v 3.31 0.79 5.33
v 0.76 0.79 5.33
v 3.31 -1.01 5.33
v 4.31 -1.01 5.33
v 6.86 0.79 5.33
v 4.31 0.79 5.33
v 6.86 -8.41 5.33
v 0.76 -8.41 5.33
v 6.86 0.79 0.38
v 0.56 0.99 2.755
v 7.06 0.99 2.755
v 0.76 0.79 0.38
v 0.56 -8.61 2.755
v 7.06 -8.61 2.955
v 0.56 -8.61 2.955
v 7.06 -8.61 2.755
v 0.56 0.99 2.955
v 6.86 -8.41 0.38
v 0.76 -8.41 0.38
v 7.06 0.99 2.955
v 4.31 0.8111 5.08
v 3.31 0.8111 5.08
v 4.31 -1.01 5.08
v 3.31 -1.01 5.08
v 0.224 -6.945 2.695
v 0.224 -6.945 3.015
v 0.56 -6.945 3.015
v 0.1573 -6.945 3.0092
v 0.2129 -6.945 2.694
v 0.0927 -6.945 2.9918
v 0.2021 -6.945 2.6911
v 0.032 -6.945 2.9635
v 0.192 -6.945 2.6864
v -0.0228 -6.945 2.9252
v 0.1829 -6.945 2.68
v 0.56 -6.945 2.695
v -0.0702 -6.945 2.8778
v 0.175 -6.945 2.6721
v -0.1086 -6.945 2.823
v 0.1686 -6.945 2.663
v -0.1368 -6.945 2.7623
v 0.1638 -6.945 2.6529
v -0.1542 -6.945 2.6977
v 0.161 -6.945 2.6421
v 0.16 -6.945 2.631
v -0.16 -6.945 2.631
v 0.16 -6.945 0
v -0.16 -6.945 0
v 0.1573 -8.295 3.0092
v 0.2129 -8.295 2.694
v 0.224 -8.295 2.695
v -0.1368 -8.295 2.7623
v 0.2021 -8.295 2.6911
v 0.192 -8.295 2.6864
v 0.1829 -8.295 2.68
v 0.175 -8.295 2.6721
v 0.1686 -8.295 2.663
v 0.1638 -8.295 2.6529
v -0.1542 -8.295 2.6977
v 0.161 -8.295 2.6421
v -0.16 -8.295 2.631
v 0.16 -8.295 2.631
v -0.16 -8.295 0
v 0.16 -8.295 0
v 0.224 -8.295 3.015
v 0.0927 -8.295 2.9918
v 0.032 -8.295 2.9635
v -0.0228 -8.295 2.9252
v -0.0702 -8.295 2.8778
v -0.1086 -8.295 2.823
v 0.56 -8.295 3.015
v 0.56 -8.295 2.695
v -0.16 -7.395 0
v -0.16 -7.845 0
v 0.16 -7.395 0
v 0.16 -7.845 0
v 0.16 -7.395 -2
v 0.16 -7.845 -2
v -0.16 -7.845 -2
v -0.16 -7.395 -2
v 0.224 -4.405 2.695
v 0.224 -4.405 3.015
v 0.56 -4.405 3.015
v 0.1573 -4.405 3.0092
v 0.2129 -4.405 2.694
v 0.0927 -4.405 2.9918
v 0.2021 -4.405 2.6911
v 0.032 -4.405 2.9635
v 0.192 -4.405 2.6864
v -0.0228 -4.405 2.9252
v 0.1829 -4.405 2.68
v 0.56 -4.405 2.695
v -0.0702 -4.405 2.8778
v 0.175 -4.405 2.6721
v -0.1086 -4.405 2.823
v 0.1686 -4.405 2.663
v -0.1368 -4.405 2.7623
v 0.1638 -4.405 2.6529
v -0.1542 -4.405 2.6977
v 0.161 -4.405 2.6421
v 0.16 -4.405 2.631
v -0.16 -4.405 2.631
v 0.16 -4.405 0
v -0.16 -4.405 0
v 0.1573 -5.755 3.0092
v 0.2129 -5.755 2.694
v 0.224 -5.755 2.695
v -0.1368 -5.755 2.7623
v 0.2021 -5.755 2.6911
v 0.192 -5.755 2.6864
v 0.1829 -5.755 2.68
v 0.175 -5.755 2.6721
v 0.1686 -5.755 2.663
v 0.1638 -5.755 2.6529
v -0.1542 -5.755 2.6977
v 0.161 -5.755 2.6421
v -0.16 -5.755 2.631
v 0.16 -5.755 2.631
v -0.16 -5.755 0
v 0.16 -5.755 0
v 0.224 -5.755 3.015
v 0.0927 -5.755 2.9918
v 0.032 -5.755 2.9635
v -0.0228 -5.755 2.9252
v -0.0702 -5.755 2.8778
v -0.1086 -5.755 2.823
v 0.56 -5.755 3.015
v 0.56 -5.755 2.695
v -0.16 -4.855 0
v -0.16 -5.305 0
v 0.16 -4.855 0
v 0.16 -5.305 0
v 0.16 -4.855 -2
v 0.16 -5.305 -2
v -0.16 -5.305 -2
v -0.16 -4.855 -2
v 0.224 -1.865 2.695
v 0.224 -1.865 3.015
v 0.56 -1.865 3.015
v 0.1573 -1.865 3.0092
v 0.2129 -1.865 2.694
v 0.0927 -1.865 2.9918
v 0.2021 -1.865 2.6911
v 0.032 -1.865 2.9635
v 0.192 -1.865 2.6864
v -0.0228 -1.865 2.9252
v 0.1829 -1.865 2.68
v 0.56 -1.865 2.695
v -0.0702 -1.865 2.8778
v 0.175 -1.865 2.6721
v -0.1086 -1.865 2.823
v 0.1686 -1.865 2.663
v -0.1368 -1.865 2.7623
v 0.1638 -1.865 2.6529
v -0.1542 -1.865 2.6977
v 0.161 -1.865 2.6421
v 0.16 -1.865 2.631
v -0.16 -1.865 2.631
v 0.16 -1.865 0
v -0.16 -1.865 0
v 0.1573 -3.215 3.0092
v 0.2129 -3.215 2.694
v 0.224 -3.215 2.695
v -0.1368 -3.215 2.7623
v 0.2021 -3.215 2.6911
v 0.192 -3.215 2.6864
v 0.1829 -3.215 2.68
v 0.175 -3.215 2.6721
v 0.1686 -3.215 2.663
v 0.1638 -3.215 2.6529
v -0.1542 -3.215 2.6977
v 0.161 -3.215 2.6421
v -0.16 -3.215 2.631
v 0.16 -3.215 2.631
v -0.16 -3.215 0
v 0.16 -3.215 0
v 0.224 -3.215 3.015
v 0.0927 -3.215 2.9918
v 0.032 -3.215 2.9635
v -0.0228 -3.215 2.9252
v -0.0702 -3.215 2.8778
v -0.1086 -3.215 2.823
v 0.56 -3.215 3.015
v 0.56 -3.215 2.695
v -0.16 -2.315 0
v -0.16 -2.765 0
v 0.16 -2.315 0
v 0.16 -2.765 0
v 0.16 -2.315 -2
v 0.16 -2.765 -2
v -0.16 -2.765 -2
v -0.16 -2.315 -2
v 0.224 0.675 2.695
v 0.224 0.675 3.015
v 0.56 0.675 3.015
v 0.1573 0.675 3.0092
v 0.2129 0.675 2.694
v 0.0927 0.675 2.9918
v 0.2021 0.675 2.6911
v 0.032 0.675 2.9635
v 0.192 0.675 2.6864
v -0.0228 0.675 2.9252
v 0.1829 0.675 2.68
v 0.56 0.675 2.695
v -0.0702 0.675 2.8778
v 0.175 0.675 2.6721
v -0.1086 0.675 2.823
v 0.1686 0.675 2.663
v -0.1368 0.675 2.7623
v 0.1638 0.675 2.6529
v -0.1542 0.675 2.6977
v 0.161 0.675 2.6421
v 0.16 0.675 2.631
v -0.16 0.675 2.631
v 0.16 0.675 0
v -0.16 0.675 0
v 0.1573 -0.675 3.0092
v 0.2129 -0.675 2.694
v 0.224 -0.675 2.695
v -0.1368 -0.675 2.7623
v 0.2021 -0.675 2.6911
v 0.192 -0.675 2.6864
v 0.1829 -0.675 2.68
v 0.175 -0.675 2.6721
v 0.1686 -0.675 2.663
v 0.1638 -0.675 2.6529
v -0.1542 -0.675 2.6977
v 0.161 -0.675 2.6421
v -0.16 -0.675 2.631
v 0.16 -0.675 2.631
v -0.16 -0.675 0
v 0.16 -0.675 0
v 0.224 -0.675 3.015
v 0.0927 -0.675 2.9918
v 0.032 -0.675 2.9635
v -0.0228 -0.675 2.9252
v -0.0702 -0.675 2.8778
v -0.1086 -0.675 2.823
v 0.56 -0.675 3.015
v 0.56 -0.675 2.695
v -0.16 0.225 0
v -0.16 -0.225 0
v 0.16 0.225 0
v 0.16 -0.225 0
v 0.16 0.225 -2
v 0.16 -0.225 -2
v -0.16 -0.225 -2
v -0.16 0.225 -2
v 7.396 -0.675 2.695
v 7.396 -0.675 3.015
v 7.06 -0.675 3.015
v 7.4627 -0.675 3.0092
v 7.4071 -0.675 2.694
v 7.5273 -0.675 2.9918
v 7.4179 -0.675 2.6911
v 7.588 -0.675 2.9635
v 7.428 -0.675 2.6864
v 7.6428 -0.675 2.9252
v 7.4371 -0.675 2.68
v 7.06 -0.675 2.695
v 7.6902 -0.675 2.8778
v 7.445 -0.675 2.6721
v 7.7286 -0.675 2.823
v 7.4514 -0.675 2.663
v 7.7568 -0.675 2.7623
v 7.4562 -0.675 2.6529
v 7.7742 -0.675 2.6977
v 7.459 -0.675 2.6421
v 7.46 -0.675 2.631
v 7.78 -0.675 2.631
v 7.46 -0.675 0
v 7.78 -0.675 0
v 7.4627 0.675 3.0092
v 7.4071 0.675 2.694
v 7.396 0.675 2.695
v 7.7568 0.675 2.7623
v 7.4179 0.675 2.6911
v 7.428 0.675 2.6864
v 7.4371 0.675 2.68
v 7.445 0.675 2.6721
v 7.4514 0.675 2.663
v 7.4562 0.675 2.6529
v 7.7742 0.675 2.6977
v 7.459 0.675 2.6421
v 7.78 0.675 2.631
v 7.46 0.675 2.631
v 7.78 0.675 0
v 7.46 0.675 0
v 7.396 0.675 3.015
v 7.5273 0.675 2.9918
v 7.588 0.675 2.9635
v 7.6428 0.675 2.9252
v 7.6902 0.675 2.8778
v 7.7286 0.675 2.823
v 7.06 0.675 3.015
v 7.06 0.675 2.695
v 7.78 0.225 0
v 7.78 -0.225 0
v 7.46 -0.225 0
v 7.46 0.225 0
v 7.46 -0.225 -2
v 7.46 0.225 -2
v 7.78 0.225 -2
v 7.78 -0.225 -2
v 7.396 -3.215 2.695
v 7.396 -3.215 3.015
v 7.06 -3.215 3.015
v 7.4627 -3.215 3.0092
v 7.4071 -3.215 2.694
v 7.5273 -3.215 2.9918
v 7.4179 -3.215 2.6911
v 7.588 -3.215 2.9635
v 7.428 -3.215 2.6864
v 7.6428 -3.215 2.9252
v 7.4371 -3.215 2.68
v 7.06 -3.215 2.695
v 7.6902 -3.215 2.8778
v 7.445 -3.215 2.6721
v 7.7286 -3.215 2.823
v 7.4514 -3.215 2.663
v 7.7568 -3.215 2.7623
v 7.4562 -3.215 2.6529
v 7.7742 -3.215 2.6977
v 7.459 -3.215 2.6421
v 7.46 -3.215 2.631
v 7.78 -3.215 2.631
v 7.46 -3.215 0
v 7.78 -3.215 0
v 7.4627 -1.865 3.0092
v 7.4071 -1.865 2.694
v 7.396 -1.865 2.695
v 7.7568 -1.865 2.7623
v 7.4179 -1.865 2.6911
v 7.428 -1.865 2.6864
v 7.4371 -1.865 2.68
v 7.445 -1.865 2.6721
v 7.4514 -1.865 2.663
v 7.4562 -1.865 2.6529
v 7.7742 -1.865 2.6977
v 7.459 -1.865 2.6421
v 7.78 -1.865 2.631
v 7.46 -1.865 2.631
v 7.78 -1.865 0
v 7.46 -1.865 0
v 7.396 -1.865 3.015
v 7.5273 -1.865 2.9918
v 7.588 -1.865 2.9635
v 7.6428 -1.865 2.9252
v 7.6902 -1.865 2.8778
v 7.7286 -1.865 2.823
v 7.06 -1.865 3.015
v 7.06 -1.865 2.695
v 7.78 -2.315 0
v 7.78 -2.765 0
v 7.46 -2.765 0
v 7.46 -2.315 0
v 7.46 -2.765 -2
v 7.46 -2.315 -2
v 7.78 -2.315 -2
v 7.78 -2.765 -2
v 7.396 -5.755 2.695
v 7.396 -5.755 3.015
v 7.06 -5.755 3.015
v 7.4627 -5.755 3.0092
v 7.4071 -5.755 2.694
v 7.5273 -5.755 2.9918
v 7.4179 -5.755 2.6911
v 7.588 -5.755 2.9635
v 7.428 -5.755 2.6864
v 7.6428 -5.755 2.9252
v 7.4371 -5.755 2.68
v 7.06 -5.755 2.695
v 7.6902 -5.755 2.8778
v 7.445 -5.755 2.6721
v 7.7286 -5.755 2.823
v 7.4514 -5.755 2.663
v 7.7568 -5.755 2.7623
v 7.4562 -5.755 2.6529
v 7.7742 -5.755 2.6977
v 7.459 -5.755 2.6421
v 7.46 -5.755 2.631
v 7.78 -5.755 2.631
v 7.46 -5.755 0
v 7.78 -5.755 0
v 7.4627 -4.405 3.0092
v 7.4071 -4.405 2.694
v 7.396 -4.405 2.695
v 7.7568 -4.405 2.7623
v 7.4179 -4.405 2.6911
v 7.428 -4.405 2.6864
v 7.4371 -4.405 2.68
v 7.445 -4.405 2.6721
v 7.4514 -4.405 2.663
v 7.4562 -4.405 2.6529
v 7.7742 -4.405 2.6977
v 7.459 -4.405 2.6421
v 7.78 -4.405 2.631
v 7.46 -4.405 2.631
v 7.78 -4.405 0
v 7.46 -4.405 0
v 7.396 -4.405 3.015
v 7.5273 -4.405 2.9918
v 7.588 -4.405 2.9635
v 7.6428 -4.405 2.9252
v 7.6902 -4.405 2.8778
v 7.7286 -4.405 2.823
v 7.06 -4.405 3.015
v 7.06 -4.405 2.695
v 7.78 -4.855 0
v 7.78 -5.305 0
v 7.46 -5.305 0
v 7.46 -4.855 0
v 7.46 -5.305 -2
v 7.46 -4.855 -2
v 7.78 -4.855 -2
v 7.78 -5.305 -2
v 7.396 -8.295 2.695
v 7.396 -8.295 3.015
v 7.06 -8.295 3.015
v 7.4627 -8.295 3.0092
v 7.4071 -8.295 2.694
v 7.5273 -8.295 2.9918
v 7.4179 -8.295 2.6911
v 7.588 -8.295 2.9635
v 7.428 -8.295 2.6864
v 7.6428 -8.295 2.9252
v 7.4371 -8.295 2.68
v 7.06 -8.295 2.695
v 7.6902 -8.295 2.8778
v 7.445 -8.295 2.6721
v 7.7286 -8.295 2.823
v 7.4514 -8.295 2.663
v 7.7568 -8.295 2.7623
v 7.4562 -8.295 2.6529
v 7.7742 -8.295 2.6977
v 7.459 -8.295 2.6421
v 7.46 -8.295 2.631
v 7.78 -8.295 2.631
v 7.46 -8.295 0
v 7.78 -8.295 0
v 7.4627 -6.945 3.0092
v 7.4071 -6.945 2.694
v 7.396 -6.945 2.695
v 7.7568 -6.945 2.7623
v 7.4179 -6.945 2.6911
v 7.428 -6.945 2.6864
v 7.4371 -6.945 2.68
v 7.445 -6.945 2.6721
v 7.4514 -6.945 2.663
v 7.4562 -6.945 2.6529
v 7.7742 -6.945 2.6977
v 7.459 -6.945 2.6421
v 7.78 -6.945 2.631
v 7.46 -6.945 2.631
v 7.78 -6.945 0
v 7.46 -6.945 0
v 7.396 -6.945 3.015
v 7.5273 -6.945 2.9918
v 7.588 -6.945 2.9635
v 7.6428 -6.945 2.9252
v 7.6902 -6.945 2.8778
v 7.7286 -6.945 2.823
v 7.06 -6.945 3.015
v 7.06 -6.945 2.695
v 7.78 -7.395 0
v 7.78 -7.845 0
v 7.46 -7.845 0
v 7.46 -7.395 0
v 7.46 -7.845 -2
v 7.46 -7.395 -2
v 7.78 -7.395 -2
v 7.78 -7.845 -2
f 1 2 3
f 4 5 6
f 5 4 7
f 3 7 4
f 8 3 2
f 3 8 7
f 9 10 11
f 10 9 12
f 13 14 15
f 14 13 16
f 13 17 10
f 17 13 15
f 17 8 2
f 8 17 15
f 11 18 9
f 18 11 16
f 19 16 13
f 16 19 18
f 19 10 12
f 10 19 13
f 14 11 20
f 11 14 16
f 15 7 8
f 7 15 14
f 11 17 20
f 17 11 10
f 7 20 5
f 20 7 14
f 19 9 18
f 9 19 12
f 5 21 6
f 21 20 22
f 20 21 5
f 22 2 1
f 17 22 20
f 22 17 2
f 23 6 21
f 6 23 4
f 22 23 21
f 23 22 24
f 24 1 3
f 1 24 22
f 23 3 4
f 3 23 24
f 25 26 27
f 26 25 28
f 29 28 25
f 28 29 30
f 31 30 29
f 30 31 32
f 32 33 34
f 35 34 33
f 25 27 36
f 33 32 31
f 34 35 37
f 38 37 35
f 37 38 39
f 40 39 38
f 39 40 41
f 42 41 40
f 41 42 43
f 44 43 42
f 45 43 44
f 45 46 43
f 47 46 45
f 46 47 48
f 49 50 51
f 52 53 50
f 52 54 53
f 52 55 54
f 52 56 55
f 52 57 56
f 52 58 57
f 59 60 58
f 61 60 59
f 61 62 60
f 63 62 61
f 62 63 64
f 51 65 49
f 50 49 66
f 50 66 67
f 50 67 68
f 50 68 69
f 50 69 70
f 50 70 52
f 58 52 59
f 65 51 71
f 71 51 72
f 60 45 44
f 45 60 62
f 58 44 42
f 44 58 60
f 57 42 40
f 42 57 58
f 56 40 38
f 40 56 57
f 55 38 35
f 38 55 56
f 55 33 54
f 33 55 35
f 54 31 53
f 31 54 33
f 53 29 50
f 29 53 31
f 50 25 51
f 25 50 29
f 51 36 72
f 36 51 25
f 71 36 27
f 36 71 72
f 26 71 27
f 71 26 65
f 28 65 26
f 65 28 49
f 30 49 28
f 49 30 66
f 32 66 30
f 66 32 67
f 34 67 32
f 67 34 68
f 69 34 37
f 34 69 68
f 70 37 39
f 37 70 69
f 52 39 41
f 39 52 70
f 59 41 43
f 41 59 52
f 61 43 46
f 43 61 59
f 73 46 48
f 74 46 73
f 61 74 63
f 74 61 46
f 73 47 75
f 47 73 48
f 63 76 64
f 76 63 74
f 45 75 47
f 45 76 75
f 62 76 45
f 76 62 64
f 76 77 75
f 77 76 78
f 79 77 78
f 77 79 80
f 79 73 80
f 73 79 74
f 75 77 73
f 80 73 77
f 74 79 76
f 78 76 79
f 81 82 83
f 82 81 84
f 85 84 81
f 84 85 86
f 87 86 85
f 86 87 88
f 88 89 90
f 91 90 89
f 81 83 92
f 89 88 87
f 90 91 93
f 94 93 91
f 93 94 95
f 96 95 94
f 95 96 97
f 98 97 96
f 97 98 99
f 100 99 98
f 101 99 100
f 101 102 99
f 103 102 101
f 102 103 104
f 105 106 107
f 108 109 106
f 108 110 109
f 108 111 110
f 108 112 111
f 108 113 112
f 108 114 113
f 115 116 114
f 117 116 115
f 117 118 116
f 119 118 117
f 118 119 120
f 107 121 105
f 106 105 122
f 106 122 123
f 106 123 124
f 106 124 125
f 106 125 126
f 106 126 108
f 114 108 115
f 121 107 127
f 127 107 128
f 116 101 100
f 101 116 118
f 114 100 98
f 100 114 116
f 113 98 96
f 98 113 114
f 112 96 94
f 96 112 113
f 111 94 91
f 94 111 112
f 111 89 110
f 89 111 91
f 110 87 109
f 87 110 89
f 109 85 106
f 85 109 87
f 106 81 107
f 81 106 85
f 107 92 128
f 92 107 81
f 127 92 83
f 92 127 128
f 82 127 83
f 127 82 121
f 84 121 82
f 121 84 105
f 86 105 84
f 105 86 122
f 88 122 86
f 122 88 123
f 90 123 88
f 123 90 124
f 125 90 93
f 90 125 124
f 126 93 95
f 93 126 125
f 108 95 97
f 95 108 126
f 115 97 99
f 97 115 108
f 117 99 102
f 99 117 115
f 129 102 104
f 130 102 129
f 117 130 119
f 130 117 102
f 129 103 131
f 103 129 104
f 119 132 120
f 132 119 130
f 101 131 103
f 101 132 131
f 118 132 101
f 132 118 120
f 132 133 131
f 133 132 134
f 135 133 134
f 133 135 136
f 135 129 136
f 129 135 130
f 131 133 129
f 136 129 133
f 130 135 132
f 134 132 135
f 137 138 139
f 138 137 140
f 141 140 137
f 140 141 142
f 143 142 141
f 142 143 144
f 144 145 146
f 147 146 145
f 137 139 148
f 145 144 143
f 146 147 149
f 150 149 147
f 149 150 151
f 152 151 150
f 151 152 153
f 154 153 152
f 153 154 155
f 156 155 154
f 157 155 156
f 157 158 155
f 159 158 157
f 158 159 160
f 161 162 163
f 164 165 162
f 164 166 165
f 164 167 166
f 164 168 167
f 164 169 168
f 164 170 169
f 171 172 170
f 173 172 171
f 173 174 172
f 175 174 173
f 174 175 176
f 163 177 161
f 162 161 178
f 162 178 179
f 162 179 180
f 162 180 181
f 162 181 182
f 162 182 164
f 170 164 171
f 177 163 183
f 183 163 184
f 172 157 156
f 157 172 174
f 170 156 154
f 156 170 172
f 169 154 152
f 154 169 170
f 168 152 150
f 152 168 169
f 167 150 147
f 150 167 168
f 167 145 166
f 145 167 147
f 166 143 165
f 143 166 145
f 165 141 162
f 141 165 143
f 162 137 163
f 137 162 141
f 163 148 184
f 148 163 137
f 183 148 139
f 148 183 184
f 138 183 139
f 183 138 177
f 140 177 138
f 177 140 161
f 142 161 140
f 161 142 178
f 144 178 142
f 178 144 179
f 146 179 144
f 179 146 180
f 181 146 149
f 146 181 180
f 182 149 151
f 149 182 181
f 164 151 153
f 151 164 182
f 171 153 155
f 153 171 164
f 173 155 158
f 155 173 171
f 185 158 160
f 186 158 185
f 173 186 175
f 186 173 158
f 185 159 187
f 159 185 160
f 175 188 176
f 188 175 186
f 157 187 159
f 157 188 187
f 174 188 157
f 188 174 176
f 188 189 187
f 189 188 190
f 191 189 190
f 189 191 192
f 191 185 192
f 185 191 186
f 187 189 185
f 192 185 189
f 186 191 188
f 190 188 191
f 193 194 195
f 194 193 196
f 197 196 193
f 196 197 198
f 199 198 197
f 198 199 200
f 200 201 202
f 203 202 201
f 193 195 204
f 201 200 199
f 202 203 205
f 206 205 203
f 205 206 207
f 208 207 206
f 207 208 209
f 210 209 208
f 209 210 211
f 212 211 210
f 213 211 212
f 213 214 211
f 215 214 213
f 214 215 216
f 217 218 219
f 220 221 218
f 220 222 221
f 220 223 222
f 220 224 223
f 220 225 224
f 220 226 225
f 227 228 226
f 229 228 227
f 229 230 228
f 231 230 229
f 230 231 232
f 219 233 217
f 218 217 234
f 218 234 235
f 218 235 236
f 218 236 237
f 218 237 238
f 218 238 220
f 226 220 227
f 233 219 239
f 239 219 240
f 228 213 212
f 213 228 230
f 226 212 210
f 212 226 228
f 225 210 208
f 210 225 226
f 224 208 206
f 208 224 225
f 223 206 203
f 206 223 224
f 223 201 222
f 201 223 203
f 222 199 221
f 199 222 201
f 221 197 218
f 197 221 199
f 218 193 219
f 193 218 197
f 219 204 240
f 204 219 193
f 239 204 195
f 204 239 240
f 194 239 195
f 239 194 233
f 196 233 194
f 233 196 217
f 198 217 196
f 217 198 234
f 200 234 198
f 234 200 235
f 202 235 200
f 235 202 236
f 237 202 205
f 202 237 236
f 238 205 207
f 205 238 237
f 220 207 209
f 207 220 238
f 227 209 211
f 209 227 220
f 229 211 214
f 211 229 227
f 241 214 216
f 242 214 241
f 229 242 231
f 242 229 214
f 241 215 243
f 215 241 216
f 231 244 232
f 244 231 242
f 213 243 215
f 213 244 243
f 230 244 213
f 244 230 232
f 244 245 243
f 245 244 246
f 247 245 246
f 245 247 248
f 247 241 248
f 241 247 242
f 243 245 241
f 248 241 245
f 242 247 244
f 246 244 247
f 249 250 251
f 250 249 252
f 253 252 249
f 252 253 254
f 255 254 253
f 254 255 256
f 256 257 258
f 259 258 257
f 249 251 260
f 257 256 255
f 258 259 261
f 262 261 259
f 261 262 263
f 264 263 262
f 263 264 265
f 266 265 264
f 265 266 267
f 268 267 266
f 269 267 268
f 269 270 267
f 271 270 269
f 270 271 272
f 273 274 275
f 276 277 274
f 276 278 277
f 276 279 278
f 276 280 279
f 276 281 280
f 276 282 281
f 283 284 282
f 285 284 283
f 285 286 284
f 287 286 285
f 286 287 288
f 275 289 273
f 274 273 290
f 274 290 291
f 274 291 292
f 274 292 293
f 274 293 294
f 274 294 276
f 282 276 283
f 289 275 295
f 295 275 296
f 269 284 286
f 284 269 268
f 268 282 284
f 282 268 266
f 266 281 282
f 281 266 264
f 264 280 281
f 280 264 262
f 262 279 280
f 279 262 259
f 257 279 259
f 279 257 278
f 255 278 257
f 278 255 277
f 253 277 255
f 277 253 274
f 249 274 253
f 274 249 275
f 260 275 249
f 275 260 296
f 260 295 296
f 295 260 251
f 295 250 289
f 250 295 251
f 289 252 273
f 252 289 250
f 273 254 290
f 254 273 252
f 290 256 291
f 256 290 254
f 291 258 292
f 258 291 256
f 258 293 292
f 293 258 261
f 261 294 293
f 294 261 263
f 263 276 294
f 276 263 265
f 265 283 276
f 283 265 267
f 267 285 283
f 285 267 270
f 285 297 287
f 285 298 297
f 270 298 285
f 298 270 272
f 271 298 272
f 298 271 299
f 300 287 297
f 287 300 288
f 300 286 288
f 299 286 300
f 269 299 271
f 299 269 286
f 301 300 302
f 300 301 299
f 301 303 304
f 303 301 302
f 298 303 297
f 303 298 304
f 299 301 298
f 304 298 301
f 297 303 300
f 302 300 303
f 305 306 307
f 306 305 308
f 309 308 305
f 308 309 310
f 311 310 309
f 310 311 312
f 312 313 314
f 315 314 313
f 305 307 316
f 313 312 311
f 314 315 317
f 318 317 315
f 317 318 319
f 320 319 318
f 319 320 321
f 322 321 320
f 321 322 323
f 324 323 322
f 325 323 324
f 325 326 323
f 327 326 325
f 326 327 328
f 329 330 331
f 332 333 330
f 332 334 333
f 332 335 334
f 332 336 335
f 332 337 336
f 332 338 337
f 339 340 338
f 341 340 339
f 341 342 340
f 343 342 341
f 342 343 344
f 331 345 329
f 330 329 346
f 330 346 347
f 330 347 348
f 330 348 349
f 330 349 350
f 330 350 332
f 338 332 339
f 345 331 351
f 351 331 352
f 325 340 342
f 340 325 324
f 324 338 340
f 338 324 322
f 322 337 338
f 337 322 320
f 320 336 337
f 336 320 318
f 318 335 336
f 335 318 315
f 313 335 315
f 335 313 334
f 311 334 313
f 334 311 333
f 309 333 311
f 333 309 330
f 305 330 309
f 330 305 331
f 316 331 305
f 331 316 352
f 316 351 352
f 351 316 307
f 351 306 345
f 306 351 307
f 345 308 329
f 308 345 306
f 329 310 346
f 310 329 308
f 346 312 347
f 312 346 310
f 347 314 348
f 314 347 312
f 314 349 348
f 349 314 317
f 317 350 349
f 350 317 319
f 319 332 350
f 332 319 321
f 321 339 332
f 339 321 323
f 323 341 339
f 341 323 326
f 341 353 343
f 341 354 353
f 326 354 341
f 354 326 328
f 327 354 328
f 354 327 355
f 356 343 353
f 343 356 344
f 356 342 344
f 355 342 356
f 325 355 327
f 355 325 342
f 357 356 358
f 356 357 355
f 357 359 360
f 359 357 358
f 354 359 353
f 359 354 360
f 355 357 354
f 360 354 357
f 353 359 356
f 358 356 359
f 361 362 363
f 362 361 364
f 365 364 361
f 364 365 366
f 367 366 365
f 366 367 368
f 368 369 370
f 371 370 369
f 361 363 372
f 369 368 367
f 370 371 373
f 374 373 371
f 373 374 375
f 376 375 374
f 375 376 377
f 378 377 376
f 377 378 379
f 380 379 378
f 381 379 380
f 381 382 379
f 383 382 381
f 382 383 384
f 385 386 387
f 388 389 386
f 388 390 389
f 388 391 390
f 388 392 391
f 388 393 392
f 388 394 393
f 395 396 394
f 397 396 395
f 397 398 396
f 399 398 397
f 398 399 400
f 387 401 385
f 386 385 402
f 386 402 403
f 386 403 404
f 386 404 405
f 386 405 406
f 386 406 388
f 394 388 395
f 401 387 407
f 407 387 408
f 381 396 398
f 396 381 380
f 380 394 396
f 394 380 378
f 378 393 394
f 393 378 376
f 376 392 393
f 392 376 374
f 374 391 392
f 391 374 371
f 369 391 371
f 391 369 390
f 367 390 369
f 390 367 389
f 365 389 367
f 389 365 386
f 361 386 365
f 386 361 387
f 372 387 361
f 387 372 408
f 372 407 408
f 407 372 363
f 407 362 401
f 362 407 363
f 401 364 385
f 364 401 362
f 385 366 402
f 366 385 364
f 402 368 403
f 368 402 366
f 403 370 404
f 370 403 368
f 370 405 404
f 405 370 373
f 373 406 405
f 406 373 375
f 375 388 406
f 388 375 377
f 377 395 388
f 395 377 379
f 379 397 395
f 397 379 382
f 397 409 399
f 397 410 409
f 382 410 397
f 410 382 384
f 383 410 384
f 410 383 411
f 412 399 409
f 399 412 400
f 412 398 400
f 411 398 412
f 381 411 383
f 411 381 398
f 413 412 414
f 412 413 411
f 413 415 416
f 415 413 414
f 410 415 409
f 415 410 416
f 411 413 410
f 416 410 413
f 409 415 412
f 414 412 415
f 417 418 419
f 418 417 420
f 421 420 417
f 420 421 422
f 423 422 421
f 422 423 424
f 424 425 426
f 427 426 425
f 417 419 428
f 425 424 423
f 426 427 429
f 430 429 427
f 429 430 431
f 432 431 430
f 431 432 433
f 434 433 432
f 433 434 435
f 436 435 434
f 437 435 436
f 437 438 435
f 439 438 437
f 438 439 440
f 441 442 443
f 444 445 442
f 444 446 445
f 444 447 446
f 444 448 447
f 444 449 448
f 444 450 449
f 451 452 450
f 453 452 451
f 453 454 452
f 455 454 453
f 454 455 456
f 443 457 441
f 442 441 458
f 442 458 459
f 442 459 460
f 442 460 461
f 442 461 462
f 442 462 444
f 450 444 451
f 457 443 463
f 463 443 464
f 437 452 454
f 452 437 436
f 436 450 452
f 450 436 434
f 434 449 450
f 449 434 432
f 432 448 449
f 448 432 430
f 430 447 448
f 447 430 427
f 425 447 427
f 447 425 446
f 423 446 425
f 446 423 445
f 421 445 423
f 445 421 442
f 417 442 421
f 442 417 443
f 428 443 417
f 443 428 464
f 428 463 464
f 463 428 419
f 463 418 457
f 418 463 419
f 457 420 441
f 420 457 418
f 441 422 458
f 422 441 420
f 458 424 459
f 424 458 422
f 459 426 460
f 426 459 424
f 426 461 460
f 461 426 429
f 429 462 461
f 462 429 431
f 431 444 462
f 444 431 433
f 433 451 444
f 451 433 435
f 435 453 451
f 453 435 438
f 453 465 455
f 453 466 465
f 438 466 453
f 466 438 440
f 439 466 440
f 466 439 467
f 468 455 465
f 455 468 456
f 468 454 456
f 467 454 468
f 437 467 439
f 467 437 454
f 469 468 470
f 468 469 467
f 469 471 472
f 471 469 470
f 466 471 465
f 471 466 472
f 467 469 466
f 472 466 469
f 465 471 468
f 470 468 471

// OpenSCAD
// file: proto/dip.scad
/*
OpenSCAD Model:  DIP package

Parameters:
  N  - Number of pins
  P  - Pitch
  TC - Width
  W  - Width of pin
  T  - Thickness of pin
  A  - Body length
  B  - Body width
  H  - Body height
  K  - Elevation
  h  - Pin length
  pincolor - color of pin
  bodycolor - color of plastic body
  simple - 0 = realistic model, 1 = simplified model
*/

module dip(
	N=14,
	P=2.54,
	TC=7.62,
	W=0.45,
	H=5.33,
	T=0.375,
	A=6.35,
	B=19.2,
	K=0.38,
	h=2.0,
	pincolor=[0.9,0.9,0.9],
	bodycolor=[0.2,0.2,0.2],
	simple=0
) {

	module dippinblock()	{
		q=[0,0.173648178,0.342020143,0.5,0.64278761,0.766044443,0.866025404,0.939692621,0.984807753,1];

		x=0.01;
		t2=T/2;
		hk=(H-K)/2+K;
		dt=1.2*T;
		dt2=dt-T;
		cx=dt-t2;
		cy= hk+t2-dt;
		color(pincolor) for (i=[0:(N/2)-1]) {
			 union () {
					translate ([0,-((N/2)-1)/2*P+i*P+1.5*W,0]) rotate(90,[1,0,0]) linear_extrude(height=3*W) {
					if (simple) {
						polygon([
							[-t2,0], [-t2, hk+t2-dt], 	[dt-t2,hk+t2], [(TC-A)/2,hk+t2],[(TC-A)/2,hk-t2], [dt-t2,hk-t2], [t2,hk+t2-dt], [t2,0]]
						);
					} else {
						 polygon([
							[-t2,0],
							[cx-dt*q[9],dt*q[0]+cy],[cx-dt*q[8],dt*q[1]+cy],[cx-dt*q[7],dt*q[2]+cy],[cx-dt*q[6],dt*q[3]+cy],[cx-dt*q[5],dt*q[4]+cy],
							[cx-dt*q[4],dt*q[5]+cy],[cx-dt*q[3],dt*q[6]+cy],[cx-dt*q[2],dt*q[7]+cy],[cx-dt*q[1],dt*q[8]+cy],[cx-dt*q[0],dt*q[9]+cy],
							[dt-t2,hk+t2],
							[(TC-A)/2,hk+t2],[(TC-A)/2,hk-t2],
							[cx-dt2*q[0],dt2*q[9]+cy],[cx-dt2*q[1],dt2*q[8]+cy],[cx-dt2*q[2],dt2*q[7]+cy],[cx-dt2*q[3],dt2*q[6]+cy],[cx-dt2*q[4],dt2*q[5]+cy],
							[cx-dt2*q[5],dt2*q[4]+cy],[cx-dt2*q[6],dt2*q[3]+cy],[cx-dt2*q[7],dt2*q[2]+cy],[cx-dt2*q[8],dt2*q[1]+cy],[cx-dt2*q[9],dt2*q[0]+cy],
							[t2,0]]
						);
					}
					}
				translate ([0,-((N/2)-1)/2*P+i*P,-1]) cube([T,W,2],center=true);
			}
		}
	}
	color(bodycolor) {
		translate([0,0,(H-K)/2+K]) {
			difference() {
			if (simple) {
				cube([A,B,H-K],center=true);
			} else {
				polyhedron(
					[[-A/2+0.2,B/2-0.2,(H-K)/2],[A/2-0.2,B/2-0.2,(H-K)/2],[A/2-0.2,-B/2+0.2,(H-K)/2],[-A/2+0.2,-B/2+0.2,(H-K)/2],
					 [-A/2,B/2,0.1],[A/2,B/2,0.1],[A/2,-B/2,0.1],[-A/2,-B/2,0.1],
					 [-A/2,B/2,-0.1],[A/2,B/2,-0.1],[A/2,-B/2,-0.1],[-A/2,-B/2,-0.1],
					 [-A/2+0.2,B/2-0.2,-(H-K)/2],[A/2-0.2,B/2-0.2,-(H-K)/2],[A/2-0.2,-B/2+0.2,-(H-K)/2],[-A/2+0.2,-B/2+0.2,-(H-K)/2]],
					[
					[0,1,2],[2,3,0],[14,13,12],[12,15,14],
					[0,4,5],[5,1,0],[1,5,6],[6,2,1],[2,6,7],[7,3,2],[3,7,4],[4,0,3],
					[4,8,9],[9,5,4],[5,9,10],[10,6,5],[6,10,11],[11,7,6],[11,8,4],[4,7,11],
					[8,12,13],[13,9,8],[9,13,14],[14,10,9],[10,14,15],[15,11,10],[11,15,12],[12,8,11],
					]
				);
			}
			translate([0,B/2-1,(H-K)/2]) cube([1,2,0.5],center=true);
			}
		}
	}

	translate([-TC/2,0,0]) dippinblock();
	translate([TC/2,0,0]) rotate(180,[0,0,1]) dippinblock();
}
// main file
/*

DIP 8, 0.300mil

*/

include <proto/dip.scad>

translate ([3.81,-3.81,0]) dip(
	N=8,
	P=2.54,
	TC=7.62,
	W=0.45,
	T=0.32,
	A=6.5,
	B=9.6,
	H=5.33,
	K=0.38,
	h=3.55
);
